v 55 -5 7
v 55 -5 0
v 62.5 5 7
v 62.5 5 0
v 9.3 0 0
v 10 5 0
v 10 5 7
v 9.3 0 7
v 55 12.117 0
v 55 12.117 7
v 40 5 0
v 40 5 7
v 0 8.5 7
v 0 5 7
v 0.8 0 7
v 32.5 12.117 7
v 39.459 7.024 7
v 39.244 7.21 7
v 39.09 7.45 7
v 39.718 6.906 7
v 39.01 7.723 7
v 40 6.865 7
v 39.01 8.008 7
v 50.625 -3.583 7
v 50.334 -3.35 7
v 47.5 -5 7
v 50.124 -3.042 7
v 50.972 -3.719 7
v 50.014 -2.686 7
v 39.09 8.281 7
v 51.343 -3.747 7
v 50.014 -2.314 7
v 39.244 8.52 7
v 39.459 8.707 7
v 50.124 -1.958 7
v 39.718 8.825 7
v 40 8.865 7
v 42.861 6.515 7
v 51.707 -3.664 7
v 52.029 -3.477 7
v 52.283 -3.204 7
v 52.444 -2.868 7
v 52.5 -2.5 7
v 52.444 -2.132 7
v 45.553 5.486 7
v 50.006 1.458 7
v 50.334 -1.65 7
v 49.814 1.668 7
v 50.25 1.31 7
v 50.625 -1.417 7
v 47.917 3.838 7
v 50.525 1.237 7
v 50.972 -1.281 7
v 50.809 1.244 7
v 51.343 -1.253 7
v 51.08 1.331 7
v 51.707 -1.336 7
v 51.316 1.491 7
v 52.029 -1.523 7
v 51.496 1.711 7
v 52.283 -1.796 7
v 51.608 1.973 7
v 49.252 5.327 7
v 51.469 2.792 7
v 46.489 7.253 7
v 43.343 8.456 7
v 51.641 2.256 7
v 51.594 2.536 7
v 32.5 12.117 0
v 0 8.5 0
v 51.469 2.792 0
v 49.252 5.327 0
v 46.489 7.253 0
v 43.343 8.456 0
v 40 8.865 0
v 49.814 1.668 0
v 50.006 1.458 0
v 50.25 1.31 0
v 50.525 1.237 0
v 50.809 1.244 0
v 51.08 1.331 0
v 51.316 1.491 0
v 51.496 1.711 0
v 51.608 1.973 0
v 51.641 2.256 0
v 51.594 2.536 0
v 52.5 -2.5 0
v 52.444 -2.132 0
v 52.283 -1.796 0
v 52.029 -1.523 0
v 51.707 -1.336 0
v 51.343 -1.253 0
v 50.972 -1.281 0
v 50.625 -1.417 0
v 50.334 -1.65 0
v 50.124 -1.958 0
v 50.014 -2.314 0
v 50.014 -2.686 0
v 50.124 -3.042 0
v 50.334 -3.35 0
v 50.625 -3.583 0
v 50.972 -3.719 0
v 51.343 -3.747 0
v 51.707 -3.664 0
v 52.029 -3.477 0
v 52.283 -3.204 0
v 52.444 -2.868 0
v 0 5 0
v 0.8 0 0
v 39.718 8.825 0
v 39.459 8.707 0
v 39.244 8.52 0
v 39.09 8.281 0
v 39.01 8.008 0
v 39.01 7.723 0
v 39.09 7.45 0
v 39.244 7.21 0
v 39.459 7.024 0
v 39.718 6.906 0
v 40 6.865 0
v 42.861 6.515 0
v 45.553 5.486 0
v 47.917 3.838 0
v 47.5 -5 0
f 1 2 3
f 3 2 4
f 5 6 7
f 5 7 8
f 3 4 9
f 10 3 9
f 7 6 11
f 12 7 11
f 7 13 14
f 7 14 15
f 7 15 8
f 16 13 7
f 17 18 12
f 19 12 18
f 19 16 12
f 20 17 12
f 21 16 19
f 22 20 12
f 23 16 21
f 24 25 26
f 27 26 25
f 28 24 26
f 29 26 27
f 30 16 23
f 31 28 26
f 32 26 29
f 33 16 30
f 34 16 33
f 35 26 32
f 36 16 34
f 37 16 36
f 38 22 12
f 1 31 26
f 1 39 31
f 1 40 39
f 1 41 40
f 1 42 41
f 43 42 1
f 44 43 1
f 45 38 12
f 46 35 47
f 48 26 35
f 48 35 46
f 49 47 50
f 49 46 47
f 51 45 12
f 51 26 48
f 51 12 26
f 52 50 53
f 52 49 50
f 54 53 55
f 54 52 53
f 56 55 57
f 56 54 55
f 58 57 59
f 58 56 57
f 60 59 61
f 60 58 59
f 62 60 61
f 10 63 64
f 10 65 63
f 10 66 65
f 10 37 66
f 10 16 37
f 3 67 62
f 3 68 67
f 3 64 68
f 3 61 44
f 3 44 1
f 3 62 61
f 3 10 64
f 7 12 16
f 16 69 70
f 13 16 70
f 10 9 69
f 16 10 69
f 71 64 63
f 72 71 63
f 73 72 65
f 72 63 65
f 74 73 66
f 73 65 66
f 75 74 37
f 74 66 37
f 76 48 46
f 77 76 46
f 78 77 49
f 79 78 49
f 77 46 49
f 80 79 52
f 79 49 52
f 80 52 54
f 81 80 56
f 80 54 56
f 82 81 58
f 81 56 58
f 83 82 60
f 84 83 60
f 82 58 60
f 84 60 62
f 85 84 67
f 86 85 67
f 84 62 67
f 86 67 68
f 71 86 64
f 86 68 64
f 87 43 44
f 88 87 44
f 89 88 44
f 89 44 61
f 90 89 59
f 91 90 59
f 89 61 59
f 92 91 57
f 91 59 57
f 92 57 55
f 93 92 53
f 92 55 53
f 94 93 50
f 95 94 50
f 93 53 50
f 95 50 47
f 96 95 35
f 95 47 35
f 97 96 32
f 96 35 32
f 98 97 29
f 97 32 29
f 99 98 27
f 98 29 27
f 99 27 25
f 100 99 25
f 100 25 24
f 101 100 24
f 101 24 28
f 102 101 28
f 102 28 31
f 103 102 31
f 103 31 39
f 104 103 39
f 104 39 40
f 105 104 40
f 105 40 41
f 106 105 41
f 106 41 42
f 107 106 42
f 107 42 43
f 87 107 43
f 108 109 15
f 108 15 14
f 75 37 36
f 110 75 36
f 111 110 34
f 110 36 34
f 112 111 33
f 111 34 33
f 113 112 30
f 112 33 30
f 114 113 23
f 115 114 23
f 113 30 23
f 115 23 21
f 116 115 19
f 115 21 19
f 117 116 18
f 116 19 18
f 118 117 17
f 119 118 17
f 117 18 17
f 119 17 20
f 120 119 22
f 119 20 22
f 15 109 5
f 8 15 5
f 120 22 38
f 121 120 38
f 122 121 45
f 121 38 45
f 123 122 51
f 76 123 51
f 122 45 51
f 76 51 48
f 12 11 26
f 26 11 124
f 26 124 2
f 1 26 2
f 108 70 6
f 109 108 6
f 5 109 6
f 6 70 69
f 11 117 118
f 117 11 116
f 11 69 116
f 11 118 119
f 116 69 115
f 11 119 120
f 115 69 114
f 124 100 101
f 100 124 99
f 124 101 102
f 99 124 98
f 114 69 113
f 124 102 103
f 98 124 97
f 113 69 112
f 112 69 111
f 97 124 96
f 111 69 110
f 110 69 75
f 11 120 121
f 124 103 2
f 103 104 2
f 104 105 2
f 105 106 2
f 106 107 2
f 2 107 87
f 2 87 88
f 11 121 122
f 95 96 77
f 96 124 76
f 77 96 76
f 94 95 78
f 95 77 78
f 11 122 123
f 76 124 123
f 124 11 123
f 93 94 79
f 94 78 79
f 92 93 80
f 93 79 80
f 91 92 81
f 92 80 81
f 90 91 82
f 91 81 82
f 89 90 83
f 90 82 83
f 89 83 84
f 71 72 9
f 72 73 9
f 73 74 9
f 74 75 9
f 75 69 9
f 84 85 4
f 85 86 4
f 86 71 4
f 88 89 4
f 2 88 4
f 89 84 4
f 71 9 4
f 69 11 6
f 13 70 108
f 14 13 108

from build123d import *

# Parameters (mm, degrees)
BOSS_EXTRUDE1_DEPTH = 7
CUT_EXTRUDE1_DEPTH  = 8
CUT_EXTRUDE2_DEPTH  = 7
SKETCH5_R           = 1.25
CUT_EXTRUDE3_DEPTH  = 8
CUT_EXTRUDE4_DEPTH  = 8


with BuildPart() as part:
    # Sketch1 → Boss-Extrude1 (new body)
    with BuildSketch(Plane.XY):
        Polygon((0, 0), (10, 0), (10, 5), (40, 5), (47.5, -5), (55, -5), (62.5, 5), (55, 12.11693675), (47.5, 12.11693675), (32.5, 12.11693675), (0, 8.5), (0, 5), align=None)
    extrude(amount=BOSS_EXTRUDE1_DEPTH)

    # Sketch3 → Cut-Extrude1 (cut, through all)
    with BuildSketch(Plane.XY.offset(7)):
        Polygon((10, 5), (9.3, 0), (10, 0), align=None)
    extrude(amount=-CUT_EXTRUDE1_DEPTH, mode=Mode.SUBTRACT)

    # Sketch4 → Cut-Extrude2 (cut)
    with BuildSketch(Plane.XY.offset(7)):
        with BuildLine():
            ThreePointArc((51.468681491, 2.792101448), (46.488736675, 7.253317775), (40, 8.865334476))
            ThreePointArc((40, 8.865334476), (39, 7.865334476), (40, 6.865334476))
            ThreePointArc((40, 6.865334476), (45.552771274, 5.485842523), (49.814385807, 1.668132681))
            ThreePointArc((49.814385807, 1.668132681), (51.203518033, 1.402969222), (51.468681491, 2.792101448))
        make_face()
    extrude(amount=-CUT_EXTRUDE2_DEPTH, mode=Mode.SUBTRACT)

    # Sketch5 → Cut-Extrude3 (cut, through all)
    with BuildSketch(Plane.XY.offset(7)):
        with Locations((51.25, -2.5)):
            Circle(SKETCH5_R)
    extrude(amount=-CUT_EXTRUDE3_DEPTH, mode=Mode.SUBTRACT)

    # Sketch6 → Cut-Extrude4 (cut, through all)
    with BuildSketch(Plane.XY.offset(7)):
        Polygon((0, 0), (0.8, 0), (0, 5), align=None)
    extrude(amount=-CUT_EXTRUDE4_DEPTH, mode=Mode.SUBTRACT)


solid = part.part
